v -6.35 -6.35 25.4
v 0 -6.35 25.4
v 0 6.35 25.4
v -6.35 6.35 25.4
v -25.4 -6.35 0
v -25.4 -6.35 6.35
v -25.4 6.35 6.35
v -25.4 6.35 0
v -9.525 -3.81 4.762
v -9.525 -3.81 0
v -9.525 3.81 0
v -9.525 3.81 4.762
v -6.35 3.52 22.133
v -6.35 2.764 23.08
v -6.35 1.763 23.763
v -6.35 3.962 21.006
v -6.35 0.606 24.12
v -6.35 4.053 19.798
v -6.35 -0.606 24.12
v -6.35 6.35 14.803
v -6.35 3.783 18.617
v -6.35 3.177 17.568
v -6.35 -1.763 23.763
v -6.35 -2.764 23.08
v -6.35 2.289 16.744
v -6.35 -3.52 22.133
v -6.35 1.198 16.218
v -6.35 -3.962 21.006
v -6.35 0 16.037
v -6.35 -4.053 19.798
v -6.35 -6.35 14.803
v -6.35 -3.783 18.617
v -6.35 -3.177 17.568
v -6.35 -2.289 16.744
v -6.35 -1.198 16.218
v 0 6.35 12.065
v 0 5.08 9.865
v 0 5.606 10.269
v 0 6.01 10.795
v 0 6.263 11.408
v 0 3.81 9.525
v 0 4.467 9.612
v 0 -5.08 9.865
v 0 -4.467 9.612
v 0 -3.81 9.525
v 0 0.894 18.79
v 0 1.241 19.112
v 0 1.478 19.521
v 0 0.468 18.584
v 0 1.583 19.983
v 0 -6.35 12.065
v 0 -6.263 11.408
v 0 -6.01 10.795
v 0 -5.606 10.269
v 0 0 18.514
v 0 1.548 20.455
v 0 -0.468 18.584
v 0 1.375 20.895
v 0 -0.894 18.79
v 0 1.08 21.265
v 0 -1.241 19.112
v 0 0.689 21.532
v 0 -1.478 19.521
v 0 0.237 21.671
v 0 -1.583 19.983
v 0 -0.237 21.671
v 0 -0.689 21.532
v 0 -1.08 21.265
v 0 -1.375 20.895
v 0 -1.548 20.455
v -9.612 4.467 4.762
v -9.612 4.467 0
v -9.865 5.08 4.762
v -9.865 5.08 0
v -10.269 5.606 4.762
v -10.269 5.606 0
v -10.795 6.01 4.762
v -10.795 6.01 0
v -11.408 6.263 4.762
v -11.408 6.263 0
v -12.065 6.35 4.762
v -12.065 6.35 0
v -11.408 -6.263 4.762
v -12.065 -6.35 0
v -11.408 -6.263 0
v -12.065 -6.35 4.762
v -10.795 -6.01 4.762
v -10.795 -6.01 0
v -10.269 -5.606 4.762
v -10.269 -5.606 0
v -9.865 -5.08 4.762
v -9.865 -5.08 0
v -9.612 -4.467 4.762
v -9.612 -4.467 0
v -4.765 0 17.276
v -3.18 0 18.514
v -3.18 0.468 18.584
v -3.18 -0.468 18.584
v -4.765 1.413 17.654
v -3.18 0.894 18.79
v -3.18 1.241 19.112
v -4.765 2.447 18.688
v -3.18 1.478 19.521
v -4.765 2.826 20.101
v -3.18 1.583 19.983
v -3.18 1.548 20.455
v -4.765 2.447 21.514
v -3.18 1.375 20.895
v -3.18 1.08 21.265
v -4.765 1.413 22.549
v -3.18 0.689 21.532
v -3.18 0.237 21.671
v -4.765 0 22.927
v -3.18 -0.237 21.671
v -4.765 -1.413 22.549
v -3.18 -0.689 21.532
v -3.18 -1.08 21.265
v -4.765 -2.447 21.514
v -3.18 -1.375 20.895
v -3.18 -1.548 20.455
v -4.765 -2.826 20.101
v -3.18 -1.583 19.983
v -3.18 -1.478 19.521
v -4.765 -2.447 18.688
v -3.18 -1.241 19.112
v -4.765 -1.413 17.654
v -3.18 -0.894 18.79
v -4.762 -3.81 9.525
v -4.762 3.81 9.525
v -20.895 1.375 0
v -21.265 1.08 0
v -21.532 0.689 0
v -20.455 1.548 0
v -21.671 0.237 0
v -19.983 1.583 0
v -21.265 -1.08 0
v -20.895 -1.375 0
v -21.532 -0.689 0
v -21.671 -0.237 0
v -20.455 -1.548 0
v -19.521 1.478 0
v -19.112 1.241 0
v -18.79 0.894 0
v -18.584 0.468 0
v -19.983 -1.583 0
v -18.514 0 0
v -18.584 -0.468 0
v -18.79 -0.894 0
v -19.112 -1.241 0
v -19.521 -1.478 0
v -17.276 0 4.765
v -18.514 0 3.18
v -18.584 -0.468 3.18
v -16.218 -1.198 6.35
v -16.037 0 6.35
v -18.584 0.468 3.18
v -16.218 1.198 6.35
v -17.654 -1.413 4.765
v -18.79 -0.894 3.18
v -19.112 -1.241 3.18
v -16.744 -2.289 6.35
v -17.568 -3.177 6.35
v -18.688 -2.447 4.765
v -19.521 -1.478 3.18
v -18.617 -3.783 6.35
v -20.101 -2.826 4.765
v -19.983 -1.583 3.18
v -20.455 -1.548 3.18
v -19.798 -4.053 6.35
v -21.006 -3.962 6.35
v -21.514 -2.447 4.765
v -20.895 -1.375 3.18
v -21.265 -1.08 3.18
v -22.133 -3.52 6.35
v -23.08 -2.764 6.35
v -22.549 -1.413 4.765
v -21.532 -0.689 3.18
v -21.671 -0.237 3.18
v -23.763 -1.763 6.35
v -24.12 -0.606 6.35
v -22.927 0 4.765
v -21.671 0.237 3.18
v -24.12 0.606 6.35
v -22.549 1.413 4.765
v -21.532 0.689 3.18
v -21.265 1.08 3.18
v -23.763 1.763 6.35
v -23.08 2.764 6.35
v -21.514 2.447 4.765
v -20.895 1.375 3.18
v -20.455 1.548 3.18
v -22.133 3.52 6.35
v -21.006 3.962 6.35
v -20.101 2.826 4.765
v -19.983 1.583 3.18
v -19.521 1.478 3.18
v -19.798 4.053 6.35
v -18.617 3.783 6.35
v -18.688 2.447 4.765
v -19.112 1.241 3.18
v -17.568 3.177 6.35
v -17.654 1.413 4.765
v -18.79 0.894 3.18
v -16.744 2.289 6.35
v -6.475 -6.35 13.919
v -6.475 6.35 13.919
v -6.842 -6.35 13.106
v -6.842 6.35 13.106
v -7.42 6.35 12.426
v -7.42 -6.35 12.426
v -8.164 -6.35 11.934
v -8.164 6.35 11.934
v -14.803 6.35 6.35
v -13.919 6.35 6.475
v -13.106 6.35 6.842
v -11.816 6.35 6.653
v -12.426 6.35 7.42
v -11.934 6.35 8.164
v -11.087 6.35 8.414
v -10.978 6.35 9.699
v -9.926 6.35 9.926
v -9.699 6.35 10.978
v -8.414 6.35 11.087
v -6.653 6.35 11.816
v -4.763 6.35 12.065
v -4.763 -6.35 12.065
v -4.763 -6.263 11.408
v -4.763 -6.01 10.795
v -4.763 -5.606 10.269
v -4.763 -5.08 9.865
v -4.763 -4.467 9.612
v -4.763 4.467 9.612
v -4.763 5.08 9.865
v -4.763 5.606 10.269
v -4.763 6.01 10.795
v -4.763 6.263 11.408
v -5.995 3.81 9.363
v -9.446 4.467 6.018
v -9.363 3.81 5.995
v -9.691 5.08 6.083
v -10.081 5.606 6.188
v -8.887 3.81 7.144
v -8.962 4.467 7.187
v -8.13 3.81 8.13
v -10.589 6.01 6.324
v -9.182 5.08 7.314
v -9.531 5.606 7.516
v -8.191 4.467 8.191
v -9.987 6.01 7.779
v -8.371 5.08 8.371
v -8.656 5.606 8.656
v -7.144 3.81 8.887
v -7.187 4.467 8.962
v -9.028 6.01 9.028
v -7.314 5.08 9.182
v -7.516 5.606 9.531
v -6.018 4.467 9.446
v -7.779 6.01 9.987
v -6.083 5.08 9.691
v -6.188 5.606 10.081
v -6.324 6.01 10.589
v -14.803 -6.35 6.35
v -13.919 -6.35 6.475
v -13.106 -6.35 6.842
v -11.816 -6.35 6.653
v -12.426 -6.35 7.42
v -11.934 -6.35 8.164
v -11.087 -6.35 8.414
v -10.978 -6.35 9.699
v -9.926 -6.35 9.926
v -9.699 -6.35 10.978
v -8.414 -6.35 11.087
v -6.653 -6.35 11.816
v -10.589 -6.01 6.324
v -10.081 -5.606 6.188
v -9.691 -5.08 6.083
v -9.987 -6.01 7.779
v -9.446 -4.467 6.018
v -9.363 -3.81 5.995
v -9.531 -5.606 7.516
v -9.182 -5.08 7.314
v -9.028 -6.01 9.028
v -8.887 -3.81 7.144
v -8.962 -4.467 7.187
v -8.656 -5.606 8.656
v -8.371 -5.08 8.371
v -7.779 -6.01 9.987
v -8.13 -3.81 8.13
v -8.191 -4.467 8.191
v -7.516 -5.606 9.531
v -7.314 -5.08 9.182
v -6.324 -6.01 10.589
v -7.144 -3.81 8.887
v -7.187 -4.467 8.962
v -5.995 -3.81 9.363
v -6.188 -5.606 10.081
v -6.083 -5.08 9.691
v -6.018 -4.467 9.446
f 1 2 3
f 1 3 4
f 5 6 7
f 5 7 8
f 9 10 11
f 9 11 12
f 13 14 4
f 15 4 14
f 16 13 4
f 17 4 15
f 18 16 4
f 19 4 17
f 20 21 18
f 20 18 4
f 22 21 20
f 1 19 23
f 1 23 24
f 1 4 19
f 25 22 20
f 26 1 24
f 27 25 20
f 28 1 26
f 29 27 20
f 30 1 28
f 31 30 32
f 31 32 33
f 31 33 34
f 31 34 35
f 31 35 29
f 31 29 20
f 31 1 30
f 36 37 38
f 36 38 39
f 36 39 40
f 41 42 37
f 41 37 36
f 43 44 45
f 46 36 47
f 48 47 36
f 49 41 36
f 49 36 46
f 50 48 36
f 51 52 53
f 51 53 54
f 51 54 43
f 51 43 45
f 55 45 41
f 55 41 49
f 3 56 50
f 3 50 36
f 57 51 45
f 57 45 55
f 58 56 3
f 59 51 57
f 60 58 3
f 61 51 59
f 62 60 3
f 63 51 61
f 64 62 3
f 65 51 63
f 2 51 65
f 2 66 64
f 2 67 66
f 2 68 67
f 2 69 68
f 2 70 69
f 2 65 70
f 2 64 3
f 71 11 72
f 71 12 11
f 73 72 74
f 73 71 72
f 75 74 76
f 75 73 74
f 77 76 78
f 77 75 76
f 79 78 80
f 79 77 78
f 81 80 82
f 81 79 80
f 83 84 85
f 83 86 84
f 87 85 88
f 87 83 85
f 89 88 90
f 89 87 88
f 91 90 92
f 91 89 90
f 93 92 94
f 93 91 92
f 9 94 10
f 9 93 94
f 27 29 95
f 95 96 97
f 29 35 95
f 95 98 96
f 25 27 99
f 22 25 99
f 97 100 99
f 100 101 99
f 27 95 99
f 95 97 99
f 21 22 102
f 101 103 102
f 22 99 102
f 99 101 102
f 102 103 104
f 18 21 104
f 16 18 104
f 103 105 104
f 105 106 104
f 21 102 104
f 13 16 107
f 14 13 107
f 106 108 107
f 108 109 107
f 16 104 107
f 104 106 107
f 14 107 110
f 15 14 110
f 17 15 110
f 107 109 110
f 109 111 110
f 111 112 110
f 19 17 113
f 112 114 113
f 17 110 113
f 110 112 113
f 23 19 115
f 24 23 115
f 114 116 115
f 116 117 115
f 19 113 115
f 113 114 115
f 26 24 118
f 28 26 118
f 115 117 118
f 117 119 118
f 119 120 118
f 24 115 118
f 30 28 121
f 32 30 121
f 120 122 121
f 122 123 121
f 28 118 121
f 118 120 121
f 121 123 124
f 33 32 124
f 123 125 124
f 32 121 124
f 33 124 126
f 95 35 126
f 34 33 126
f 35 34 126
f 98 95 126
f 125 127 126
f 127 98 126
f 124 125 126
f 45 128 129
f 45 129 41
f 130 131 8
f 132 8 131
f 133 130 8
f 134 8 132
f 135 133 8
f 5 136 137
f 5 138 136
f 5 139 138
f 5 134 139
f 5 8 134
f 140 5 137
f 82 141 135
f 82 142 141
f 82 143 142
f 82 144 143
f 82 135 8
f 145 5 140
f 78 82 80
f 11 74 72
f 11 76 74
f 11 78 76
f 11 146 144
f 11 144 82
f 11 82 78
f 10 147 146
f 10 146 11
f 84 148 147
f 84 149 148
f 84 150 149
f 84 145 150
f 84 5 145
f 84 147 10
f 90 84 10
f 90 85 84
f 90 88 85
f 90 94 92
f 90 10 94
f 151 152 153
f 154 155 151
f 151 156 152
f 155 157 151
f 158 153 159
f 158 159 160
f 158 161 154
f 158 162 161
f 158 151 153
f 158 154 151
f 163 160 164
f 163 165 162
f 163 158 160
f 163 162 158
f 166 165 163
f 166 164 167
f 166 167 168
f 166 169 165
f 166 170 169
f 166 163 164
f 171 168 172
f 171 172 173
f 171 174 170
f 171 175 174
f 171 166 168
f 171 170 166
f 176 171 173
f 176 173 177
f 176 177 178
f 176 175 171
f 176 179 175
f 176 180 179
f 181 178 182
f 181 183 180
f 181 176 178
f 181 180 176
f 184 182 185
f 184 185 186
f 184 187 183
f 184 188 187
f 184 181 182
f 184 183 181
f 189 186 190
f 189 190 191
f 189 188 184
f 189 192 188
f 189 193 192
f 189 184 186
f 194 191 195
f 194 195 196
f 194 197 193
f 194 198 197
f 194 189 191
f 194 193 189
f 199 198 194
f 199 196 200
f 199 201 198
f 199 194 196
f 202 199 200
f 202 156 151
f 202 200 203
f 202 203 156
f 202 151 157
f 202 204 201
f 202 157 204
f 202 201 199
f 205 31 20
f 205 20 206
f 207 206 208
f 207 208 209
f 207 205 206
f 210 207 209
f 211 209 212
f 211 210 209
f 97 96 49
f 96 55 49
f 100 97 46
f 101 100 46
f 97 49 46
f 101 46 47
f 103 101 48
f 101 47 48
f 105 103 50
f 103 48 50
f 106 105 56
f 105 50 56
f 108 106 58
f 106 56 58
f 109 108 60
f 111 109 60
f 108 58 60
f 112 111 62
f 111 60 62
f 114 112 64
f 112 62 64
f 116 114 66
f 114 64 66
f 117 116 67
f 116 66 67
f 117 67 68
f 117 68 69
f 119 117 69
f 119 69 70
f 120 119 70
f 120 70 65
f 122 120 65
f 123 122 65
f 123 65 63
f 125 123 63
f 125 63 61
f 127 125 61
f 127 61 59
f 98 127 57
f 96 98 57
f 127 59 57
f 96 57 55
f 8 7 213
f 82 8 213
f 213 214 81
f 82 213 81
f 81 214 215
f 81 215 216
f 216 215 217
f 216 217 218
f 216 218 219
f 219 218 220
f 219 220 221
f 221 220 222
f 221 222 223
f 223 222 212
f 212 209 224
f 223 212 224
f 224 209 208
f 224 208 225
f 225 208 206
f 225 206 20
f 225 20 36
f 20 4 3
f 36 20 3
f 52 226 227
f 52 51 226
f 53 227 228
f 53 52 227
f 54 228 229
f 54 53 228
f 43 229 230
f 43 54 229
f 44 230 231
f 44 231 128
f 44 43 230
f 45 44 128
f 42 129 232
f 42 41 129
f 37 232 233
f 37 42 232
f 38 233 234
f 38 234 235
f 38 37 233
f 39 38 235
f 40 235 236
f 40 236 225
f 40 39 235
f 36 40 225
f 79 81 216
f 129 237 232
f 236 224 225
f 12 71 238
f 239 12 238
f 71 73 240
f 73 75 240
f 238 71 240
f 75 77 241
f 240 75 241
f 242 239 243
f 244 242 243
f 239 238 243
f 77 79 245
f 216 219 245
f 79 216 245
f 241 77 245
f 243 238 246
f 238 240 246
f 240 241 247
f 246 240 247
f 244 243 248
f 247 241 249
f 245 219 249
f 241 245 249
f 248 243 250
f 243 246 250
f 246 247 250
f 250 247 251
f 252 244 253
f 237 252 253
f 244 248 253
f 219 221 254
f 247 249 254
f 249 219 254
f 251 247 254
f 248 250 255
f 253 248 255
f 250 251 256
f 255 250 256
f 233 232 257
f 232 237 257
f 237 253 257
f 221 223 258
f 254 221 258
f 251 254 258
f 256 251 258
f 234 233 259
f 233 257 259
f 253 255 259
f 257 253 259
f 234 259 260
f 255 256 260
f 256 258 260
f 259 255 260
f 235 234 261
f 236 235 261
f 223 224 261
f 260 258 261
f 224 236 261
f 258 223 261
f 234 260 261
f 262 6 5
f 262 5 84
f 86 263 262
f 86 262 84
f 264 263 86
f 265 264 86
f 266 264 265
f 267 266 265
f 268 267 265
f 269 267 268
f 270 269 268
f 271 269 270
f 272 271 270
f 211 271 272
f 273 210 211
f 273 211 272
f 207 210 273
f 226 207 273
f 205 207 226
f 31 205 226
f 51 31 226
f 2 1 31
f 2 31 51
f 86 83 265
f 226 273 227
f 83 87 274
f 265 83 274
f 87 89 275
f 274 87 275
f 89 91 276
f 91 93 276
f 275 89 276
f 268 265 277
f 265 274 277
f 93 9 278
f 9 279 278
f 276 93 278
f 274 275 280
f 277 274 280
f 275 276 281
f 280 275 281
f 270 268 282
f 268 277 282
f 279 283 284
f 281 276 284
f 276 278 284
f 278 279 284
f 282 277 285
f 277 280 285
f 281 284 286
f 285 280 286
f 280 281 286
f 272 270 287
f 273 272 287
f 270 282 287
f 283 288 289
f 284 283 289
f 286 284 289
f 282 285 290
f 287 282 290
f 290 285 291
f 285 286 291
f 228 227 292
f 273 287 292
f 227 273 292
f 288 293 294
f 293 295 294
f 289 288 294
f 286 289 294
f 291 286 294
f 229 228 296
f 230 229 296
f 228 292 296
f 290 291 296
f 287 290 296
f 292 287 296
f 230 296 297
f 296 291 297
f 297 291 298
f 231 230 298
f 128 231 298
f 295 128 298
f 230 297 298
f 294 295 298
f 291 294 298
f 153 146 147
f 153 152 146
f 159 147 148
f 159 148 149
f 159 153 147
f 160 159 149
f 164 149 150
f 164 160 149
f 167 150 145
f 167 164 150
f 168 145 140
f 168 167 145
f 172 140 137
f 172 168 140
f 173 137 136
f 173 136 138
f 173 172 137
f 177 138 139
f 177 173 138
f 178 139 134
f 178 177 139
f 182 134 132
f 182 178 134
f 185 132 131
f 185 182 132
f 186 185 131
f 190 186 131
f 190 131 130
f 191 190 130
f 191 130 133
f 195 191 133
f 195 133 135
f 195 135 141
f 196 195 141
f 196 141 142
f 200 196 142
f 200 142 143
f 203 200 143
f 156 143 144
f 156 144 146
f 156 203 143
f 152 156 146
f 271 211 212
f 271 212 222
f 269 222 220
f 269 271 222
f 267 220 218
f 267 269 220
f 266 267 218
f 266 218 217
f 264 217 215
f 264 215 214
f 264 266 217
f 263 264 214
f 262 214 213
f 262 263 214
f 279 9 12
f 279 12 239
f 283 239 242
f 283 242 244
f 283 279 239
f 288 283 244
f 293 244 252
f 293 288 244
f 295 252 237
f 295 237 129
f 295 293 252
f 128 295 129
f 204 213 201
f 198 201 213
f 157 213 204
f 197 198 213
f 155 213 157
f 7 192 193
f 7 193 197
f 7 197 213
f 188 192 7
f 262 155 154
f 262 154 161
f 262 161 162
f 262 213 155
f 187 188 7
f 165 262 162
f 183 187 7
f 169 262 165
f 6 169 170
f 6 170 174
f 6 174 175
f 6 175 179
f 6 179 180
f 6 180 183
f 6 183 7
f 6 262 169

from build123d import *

# Parameters (mm, degrees)
F1_DEPTH = 6.35
F2_R     = 2.54


with BuildPart() as f1:
    # F0 (on Front) → F1 (new body, symmetric)
    with BuildSketch(Plane.XZ):
        with BuildLine():
            ThreePointArc((-9.525, 4.7625), (-8.130096, 8.130096), (-4.7625, 9.525))
            Line((-4.7625, 9.525), (0, 9.525))
            Line((0, 9.525), (0, 25.4))
            Line((0, 25.4), (-6.35, 25.4))
            Line((-6.35, 25.4), (-6.35, 14.802732))
            ThreePointArc((-6.35, 14.802732), (-6.841635, 13.105623), (-8.164286, 11.934094))
            ThreePointArc((-8.164286, 11.934094), (-10.37516, 10.37516), (-11.934094, 8.164286))
            ThreePointArc((-11.934094, 8.164286), (-13.105623, 6.841635), (-14.802732, 6.35))
            Line((-14.802732, 6.35), (-25.4, 6.35))
            Line((-25.4, 6.35), (-25.4, 0))
            Line((-25.4, 0), (-9.525, 0))
            Line((-9.525, 0), (-9.525, 4.7625))
        make_face()
    extrude(amount=F1_DEPTH, both=True)

    # F2
    f2_edges = [f1.edges().sort_by_distance(p)[0] for p in [
        (-2.38125, -6.35, 9.525),
        (-8.130096, 6.35, 8.130096),
    ]]
    fillet(f2_edges, radius=F2_R)

    # F3 (on Front) → F4 (revolve, cut)
    with BuildSketch(Plane.XZ):
        Polygon((-20.101366, 0), (-18.513866, 0), (-18.513866, 3.180225), (-16.037366, 6.35), (-13.194864, 9.988236), (-20.101366, 9.988236), align=None)
    revolve(axis=Axis((-20.101366, 0, 3.175), (0, 0, -1)), mode=Mode.SUBTRACT)

    # F5 (on Front) → F6 (revolve, cut)
    with BuildSketch(Plane.XZ):
        Polygon((-9.988236, 13.194864), (-6.35, 16.037366), (-3.180225, 18.513866), (0, 18.513866), (0, 20.101366), (-9.988236, 20.101366), align=None)
    revolve(axis=Axis((-4.994118, 0, 20.101366), (1, 0, 0)), mode=Mode.SUBTRACT)


solid = f1.part
